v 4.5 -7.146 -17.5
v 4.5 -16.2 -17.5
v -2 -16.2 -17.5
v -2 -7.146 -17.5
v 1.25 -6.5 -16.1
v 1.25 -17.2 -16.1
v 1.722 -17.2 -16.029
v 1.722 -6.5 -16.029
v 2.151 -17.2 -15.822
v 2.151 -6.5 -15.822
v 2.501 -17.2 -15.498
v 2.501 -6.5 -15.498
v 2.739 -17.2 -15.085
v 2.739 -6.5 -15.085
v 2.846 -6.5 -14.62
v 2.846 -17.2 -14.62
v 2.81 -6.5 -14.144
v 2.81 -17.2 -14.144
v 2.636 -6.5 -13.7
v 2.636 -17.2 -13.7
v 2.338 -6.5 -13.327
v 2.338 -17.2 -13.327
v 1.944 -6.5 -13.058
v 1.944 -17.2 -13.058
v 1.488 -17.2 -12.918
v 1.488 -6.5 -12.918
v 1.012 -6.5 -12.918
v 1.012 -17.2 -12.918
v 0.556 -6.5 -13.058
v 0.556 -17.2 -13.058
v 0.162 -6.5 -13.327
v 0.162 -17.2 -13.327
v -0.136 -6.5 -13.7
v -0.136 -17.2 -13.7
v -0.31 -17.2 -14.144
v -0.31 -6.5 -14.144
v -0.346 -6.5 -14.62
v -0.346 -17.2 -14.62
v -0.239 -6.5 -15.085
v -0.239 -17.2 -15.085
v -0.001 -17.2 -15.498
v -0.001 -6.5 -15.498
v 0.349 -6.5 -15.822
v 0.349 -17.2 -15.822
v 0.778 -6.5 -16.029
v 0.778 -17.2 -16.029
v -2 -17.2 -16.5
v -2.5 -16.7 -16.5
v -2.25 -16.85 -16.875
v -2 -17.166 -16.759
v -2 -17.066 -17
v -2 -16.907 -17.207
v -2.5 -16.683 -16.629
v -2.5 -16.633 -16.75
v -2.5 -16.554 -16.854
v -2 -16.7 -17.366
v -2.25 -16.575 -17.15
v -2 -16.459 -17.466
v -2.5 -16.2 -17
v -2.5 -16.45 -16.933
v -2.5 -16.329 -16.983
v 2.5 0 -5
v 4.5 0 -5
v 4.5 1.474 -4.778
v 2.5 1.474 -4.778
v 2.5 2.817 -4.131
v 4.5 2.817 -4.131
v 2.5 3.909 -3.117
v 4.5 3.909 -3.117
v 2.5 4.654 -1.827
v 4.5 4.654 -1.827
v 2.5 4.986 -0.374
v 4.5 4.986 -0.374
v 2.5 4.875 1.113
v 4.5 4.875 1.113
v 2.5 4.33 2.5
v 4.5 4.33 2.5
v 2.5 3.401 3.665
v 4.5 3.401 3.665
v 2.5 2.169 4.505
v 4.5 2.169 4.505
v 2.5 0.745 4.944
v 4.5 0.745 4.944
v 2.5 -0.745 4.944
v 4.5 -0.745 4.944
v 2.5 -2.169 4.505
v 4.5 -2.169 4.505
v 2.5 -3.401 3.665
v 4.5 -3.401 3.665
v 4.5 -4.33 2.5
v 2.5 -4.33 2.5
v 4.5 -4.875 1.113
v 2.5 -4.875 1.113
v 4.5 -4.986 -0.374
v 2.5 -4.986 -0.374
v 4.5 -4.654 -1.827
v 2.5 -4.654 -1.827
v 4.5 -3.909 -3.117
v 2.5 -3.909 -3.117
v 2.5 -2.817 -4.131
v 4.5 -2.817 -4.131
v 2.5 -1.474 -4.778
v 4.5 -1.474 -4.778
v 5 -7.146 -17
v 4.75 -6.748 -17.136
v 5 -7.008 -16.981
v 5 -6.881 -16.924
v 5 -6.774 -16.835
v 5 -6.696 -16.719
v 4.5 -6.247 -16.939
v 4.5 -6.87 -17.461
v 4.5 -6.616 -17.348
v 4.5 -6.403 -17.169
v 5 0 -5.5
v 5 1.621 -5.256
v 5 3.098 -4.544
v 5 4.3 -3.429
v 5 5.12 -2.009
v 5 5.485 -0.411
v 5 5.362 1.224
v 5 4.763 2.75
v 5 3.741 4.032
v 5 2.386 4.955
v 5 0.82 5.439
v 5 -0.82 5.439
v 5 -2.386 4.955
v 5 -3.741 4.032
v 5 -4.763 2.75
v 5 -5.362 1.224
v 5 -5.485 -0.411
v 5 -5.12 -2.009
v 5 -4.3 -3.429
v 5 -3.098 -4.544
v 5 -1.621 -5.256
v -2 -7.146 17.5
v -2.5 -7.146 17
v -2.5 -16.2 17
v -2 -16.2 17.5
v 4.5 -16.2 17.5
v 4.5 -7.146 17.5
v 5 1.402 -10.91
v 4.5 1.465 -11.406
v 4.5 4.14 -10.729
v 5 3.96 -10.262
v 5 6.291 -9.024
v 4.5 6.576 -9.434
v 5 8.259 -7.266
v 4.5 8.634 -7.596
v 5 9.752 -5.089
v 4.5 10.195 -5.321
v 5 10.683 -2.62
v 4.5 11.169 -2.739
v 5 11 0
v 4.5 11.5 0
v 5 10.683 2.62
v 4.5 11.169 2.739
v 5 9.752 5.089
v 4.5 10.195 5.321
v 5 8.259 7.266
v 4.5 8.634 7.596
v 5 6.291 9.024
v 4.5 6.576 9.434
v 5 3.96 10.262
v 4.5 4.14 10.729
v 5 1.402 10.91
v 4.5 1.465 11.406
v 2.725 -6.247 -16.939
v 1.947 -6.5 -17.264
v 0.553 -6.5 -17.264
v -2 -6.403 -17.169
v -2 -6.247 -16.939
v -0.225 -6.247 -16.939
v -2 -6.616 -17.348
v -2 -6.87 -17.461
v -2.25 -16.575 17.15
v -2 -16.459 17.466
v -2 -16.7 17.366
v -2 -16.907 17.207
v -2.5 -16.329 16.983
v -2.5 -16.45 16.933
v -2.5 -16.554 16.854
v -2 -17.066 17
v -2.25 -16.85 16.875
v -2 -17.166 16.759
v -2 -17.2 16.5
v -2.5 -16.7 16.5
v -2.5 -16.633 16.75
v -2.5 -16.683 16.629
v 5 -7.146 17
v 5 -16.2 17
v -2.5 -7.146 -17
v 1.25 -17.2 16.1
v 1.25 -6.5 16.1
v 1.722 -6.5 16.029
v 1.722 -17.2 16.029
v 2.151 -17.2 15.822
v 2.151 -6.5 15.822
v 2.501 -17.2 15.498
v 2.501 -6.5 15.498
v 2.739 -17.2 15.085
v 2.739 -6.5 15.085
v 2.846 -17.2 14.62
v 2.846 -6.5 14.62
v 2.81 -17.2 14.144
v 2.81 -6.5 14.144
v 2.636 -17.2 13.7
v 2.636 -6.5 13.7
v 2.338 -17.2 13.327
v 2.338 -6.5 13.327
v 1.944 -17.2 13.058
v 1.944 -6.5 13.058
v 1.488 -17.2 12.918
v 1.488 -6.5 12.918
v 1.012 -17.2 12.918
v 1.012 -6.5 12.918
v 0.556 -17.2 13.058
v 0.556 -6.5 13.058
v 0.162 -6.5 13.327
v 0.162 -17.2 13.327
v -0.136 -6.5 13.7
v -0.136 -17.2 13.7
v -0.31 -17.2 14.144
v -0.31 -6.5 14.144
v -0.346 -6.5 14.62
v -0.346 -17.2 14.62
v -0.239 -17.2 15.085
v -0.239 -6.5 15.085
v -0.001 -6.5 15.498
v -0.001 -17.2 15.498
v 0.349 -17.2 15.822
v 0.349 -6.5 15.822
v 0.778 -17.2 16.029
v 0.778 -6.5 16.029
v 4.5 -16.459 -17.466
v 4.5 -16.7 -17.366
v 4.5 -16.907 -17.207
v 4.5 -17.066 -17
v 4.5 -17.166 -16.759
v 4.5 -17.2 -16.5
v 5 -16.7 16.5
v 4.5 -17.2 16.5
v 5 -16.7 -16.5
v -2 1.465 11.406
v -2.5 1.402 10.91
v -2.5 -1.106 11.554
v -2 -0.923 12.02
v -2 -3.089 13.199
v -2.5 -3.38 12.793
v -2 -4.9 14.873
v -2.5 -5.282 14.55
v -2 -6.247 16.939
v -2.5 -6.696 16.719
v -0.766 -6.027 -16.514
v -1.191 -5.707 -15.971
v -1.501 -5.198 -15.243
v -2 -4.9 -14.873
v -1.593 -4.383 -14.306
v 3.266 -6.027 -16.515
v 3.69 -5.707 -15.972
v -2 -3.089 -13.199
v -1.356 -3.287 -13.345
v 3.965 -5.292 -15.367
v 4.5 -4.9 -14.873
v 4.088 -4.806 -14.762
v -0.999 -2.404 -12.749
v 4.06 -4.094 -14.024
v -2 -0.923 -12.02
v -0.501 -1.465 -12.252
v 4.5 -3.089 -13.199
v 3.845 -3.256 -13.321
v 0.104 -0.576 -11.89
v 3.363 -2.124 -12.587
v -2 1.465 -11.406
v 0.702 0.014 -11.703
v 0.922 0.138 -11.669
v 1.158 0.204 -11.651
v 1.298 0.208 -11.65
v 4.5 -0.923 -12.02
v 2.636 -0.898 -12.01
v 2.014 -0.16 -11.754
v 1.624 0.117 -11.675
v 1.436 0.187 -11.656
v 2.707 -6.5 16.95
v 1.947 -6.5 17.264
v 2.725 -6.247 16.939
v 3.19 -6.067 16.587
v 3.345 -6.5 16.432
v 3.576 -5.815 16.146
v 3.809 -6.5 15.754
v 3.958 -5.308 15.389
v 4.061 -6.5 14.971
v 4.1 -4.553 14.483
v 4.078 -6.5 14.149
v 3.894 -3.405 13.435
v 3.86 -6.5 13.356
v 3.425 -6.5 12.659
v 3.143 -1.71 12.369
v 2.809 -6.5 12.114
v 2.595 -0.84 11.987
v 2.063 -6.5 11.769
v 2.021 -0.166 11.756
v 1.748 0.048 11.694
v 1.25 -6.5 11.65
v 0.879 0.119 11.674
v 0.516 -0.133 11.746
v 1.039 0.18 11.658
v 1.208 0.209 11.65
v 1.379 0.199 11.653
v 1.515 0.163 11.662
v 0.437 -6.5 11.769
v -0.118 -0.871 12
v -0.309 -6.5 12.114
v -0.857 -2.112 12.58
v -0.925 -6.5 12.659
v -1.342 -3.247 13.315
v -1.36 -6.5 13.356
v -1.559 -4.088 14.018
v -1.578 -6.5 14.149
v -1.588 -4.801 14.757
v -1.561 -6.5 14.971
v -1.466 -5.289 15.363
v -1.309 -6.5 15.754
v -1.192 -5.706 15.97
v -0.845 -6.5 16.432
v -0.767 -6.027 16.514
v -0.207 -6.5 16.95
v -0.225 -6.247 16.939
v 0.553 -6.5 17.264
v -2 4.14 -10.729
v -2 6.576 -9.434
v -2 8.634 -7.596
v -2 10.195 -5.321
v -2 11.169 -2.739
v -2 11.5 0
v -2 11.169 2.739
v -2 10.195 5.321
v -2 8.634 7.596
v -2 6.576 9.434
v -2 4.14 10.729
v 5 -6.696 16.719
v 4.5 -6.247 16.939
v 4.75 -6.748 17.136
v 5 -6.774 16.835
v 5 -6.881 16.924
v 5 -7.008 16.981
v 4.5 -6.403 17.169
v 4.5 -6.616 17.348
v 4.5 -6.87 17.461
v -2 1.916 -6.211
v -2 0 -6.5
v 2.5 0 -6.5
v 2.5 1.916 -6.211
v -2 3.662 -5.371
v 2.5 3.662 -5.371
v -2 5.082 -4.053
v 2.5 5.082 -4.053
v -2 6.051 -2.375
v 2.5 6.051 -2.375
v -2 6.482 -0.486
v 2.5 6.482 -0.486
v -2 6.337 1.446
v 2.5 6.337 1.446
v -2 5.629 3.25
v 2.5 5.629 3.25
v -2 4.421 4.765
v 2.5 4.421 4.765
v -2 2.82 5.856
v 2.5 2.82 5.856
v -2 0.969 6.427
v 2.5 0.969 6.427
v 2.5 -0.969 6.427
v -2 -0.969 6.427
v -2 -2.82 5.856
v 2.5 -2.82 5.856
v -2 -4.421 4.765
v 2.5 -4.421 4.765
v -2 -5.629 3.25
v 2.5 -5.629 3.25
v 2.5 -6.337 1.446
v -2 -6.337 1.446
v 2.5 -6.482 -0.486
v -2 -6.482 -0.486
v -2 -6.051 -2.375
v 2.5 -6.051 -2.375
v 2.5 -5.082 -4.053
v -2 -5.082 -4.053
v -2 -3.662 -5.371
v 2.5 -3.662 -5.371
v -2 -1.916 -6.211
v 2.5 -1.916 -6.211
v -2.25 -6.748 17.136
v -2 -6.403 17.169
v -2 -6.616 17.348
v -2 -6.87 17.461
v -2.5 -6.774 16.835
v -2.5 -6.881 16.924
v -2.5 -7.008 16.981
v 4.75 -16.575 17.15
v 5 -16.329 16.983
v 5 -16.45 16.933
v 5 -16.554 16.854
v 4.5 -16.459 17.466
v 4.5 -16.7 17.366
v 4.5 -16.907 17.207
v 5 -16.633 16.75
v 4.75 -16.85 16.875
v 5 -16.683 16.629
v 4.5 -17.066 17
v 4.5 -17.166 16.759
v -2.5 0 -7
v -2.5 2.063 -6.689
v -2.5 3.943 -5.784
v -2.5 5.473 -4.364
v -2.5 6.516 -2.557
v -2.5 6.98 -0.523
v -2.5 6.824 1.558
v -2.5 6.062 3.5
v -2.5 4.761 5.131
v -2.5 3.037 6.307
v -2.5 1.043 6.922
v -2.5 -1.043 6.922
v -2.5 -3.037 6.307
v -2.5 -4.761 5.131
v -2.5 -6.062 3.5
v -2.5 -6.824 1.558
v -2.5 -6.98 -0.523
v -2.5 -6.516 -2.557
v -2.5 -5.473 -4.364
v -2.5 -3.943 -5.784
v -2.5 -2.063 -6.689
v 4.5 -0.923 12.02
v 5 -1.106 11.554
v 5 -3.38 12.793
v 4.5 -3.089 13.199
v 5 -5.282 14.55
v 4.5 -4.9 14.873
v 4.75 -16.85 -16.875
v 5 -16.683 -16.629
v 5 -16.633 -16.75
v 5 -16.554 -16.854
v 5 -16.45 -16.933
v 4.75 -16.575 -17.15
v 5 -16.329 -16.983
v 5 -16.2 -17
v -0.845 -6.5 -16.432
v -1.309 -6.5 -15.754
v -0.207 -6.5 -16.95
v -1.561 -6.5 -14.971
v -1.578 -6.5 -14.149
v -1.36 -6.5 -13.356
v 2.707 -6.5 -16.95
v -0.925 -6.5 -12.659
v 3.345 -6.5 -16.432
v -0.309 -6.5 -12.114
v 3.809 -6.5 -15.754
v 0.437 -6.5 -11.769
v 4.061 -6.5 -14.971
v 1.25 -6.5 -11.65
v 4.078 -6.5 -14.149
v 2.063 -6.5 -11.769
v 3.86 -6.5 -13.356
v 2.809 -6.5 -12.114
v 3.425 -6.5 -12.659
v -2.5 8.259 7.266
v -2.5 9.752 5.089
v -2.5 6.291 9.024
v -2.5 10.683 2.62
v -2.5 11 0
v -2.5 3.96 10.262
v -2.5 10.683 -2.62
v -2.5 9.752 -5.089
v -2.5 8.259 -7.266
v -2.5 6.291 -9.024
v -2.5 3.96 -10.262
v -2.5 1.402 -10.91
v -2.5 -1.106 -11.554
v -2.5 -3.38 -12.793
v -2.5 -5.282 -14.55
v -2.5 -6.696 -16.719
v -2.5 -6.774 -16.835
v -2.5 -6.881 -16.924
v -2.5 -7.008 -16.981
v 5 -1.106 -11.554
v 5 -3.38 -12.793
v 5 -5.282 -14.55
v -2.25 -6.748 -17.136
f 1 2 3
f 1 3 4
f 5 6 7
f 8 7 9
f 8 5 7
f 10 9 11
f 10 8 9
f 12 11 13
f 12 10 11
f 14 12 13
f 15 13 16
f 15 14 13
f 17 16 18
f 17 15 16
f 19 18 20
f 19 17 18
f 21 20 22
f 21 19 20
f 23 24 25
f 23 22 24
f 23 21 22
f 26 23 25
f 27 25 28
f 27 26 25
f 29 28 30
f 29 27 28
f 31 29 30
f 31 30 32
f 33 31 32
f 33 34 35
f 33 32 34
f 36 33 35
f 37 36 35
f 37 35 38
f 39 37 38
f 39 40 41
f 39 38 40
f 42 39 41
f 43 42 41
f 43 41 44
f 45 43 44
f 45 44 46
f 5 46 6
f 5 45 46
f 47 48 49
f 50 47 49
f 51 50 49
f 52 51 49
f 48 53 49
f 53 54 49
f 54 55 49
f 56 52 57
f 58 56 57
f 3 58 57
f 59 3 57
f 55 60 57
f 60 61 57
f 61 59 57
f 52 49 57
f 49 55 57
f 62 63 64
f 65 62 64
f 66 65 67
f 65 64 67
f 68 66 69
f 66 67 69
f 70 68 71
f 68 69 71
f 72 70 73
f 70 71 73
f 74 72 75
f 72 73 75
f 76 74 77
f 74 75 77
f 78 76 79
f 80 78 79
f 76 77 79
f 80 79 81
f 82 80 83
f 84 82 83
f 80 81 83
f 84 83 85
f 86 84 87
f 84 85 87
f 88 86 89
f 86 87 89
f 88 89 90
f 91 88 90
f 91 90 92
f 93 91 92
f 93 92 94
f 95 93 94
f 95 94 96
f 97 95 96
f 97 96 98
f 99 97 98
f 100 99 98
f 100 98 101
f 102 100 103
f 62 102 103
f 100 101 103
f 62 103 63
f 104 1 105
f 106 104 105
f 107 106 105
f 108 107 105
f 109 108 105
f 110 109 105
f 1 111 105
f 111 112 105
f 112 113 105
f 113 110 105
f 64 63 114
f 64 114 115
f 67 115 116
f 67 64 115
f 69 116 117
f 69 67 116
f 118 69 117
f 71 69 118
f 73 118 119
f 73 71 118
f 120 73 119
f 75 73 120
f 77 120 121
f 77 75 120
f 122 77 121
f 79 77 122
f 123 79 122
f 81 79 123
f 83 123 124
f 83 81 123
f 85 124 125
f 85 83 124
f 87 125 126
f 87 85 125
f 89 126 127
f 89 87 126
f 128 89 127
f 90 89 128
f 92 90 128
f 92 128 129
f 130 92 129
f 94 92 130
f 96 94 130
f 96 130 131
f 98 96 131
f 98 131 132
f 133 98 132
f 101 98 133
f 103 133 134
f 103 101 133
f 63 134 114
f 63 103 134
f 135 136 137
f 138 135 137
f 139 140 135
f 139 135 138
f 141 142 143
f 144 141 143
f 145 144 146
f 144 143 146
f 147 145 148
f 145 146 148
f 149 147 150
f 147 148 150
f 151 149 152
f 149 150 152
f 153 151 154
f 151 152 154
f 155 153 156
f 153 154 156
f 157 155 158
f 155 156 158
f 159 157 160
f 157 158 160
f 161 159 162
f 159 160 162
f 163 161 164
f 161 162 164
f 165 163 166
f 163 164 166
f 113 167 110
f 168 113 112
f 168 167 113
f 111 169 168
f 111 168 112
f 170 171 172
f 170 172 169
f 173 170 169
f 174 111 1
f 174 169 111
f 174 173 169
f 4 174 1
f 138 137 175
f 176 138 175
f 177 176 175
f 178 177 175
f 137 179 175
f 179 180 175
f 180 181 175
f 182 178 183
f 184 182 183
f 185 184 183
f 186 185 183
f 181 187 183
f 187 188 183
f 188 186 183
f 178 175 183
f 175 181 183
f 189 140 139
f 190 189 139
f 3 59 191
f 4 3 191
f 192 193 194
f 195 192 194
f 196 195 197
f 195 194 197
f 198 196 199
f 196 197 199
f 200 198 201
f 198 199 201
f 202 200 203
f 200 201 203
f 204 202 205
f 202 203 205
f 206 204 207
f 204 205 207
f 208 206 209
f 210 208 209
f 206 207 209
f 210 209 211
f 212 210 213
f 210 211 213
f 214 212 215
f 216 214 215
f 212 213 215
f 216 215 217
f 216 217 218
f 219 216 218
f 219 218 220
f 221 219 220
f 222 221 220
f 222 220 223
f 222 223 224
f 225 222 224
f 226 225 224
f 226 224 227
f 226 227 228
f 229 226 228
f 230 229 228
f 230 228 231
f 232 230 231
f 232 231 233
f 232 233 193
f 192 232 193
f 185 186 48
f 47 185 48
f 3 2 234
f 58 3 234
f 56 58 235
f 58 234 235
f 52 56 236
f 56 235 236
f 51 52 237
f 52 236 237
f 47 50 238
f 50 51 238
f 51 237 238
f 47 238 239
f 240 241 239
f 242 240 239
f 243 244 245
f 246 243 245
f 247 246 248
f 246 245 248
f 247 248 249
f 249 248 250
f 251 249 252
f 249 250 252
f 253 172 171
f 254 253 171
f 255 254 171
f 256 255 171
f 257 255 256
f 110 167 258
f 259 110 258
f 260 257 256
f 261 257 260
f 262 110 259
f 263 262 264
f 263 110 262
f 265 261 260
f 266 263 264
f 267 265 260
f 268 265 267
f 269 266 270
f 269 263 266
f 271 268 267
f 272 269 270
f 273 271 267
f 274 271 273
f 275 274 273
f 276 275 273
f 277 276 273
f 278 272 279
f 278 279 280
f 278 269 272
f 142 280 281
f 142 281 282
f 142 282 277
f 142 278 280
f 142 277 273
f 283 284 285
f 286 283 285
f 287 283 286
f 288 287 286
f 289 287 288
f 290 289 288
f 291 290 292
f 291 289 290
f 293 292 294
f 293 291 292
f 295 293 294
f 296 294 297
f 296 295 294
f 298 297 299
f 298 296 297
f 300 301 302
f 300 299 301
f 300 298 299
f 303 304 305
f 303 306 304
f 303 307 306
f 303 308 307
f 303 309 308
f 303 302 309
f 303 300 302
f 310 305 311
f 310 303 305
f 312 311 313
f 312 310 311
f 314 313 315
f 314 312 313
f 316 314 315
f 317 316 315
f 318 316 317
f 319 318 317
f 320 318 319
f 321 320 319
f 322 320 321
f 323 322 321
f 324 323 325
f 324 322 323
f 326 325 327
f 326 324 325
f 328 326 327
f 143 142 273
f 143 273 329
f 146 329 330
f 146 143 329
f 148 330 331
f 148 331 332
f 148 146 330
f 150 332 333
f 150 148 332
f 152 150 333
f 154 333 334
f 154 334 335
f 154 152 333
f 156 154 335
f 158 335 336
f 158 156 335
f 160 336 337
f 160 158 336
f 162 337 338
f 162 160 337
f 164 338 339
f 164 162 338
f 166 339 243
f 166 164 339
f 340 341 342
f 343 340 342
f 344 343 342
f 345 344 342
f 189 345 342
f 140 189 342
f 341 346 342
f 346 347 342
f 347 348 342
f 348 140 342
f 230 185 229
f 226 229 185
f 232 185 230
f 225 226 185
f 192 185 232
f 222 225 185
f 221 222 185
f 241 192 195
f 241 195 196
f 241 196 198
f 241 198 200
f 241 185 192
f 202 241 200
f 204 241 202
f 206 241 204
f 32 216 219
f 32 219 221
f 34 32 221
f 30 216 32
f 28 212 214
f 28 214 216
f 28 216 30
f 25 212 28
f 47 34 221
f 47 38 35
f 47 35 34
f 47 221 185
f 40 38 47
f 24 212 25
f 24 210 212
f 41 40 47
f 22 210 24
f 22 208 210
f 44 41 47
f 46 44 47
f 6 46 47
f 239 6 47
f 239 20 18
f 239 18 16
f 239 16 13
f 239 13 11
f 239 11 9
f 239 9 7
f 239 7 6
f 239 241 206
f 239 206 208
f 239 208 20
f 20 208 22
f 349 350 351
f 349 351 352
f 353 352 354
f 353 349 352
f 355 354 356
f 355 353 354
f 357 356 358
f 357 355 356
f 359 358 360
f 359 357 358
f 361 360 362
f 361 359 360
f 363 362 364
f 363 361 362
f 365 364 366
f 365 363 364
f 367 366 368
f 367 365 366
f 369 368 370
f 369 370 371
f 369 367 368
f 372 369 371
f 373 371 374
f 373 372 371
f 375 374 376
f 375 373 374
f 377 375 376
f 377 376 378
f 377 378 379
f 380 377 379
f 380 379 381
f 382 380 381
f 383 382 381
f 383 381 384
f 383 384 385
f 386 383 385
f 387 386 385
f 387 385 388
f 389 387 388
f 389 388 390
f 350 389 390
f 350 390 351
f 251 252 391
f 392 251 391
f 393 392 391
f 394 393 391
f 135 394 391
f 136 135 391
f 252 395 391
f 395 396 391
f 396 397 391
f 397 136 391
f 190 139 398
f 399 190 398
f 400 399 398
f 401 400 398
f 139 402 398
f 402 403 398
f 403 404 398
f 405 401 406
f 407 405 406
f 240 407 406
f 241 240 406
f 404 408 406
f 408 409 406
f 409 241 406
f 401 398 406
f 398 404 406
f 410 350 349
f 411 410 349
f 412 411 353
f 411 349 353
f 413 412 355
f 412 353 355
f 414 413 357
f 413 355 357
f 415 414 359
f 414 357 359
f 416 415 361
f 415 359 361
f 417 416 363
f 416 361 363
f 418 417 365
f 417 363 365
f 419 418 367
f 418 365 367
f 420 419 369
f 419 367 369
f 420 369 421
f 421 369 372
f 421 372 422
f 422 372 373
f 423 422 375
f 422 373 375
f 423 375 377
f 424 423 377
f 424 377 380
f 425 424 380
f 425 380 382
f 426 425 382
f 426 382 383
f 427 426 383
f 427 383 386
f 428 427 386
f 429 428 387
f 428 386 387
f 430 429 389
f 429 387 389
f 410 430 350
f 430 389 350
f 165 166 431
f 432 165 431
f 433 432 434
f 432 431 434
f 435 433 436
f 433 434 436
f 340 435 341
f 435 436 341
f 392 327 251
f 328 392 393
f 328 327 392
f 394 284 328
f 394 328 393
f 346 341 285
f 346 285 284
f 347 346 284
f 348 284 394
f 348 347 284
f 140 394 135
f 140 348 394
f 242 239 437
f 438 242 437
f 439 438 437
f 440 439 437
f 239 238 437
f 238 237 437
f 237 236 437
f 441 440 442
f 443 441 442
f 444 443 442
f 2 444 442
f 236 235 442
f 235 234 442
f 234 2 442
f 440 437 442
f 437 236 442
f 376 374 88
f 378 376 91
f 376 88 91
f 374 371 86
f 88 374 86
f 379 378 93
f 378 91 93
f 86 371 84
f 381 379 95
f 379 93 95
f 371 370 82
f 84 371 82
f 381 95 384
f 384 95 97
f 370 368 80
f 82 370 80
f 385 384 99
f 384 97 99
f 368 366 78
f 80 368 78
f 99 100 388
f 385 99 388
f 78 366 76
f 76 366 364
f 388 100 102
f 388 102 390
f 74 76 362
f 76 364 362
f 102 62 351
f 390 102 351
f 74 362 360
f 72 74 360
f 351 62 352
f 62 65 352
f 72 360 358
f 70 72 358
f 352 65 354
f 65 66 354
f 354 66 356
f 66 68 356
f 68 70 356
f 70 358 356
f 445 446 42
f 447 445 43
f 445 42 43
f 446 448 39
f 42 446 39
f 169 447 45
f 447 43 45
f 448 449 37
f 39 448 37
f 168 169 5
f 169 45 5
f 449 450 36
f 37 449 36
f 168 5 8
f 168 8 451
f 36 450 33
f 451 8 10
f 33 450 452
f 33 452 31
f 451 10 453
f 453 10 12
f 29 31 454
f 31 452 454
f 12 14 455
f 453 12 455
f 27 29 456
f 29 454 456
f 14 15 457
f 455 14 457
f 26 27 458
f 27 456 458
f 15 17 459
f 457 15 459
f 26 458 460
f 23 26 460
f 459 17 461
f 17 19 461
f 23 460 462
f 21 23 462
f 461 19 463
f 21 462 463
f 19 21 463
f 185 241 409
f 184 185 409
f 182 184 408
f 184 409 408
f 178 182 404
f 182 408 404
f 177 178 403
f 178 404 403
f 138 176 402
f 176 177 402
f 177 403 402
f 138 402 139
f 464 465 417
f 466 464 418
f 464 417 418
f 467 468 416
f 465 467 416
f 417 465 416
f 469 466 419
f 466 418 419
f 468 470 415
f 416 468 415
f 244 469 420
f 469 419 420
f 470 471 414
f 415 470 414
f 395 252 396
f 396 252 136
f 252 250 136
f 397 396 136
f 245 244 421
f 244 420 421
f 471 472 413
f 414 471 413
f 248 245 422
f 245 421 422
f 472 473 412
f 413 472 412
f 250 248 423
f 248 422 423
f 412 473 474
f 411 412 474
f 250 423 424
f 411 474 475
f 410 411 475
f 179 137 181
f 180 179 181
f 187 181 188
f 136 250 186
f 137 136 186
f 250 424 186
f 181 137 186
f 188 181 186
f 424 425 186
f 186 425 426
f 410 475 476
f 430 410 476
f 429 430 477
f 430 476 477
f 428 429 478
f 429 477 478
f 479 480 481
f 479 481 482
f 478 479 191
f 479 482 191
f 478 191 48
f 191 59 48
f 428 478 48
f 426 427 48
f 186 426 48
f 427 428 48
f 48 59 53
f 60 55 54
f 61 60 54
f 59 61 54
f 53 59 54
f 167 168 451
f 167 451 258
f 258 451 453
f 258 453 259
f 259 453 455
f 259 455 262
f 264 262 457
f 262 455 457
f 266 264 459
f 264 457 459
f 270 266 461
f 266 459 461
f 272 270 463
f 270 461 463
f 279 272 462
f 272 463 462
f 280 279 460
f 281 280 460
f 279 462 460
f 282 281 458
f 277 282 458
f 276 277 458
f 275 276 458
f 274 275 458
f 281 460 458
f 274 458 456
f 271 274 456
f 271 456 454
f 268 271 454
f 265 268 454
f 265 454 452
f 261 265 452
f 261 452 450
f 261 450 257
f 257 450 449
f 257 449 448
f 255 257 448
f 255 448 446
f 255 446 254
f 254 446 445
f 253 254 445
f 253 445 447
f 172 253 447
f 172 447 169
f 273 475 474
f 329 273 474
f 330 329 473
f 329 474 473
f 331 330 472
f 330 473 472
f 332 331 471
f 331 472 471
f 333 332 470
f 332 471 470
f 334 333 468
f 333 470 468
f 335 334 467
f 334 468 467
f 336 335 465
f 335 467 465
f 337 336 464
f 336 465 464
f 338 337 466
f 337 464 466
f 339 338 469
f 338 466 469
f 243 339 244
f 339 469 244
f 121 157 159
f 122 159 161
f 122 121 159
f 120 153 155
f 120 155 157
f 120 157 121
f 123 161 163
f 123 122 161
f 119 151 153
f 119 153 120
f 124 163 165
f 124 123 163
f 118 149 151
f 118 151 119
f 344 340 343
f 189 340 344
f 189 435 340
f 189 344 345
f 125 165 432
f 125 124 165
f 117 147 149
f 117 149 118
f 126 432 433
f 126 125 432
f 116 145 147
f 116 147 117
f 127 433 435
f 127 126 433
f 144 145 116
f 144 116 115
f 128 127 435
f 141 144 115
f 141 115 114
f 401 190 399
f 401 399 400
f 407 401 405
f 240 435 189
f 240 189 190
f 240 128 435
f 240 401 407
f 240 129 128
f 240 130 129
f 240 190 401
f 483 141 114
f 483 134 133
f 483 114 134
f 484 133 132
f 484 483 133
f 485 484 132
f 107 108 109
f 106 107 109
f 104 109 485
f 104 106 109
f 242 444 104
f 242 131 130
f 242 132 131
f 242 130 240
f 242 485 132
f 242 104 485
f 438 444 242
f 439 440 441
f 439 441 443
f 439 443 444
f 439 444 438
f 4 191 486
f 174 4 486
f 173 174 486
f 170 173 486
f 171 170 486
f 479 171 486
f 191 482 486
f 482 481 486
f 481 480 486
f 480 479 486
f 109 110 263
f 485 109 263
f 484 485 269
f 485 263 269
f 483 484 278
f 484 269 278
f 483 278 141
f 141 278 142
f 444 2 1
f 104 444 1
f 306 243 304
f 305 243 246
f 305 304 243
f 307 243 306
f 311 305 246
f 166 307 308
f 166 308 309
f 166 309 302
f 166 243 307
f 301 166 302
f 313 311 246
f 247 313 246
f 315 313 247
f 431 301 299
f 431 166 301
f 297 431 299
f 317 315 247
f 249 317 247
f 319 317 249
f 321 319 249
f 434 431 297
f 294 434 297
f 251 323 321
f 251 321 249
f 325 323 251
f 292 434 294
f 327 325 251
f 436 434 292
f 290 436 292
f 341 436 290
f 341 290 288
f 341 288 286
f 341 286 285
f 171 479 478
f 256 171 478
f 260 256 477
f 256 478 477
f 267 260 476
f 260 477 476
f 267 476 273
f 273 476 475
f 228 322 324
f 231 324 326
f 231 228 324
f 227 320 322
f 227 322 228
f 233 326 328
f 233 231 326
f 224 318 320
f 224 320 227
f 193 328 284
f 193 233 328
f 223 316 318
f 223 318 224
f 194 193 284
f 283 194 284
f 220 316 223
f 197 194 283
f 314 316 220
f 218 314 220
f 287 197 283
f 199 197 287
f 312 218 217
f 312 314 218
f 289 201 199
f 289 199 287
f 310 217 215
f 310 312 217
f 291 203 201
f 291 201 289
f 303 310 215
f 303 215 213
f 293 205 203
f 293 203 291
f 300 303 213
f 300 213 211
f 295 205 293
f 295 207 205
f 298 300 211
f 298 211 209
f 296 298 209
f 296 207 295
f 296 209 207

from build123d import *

# Parameters (mm, degrees)
SKETCH1_R           = 6.5
BOSS_EXTRUDE1_DEPTH = 2.5
BOSS_EXTRUDE2_START = 2.5
SKETCH2_R           = 5
BOSS_EXTRUDE2_DEPTH = 2.5
FILLET1_R           = 10
FILLET2_R           = 1
CHAMFER1_SIZE       = 0.5
SKETCH3_R           = 2.85
CUT_EXTRUDE1_DEPTH  = 26.597851472
SKETCH4_R           = 1.6
CUT_EXTRUDE2_DEPTH  = 26.597851541


with BuildPart() as part:
    # Sketch1 → Boss-Extrude1 (new, symmetric)
    with BuildSketch(Plane(origin=(0, 0, 0), x_dir=(0, 0, -1), z_dir=(1, 0, 0))):
        with BuildLine():
            Line((-9.486832981, -6.5), (-17.5, -6.5))
            Line((-17.5, -6.5), (-17.5, -17.2))
            Line((-17.5, -17.2), (17.5, -17.2))
            Line((17.5, -17.2), (17.5, -6.5))
            Line((17.5, -6.5), (9.486832981, -6.5))
            ThreePointArc((9.486832981, -6.5), (0, 11.5), (-9.486832981, -6.5))
        make_face()
        Circle(SKETCH1_R, mode=Mode.SUBTRACT)
    extrude(amount=BOSS_EXTRUDE1_DEPTH, both=True)

    # Sketch2 → Boss-Extrude2 (add)
    with BuildSketch(Plane(origin=(2.5, 0, 0), x_dir=(0, 0, -1), z_dir=(1, 0, 0)).offset(BOSS_EXTRUDE2_START)):
        with BuildLine():
            Line((-9.486832981, -6.5), (-17.5, -6.5))
            Line((-17.5, -6.5), (-17.5, -17.2))
            Line((-17.5, -17.2), (17.5, -17.2))
            Line((17.5, -17.2), (17.5, -6.5))
            Line((17.5, -6.5), (9.486832981, -6.5))
            ThreePointArc((9.486832981, -6.5), (0, 11.5), (-9.486832981, -6.5))
        make_face()
        Circle(SKETCH2_R, mode=Mode.SUBTRACT)
    extrude(amount=-BOSS_EXTRUDE2_DEPTH)

    # Fillet1
    # the kernel refuses this fillet: 10 mm, written as the material it adds along each edge
    with BuildSketch(Plane(origin=(5, -6.5, 9.486832981), x_dir=(0, 0, 1), z_dir=(-1, 0, 0))) as fillet1_piece_1:
        with BuildLine():
            CenterArc((11.837899914, 9.239665486), FILLET1_R, 187.320893322, 60.192138393)
            Line((1.919419498, 7.965402469), (1.72104989, 7.939917209))
            ThreePointArc((1.72104989, 7.939917209), (1.498721871, 3.852815723), (-0.1649884, 0.113043478))
            Line((-0.1649884, 0.113043478), (0, -0.2))
            ThreePointArc((0, -0.2), (4.00658351, -0.2), (7.936672362, -0.18479331))
            Line((7.936672362, -0.18479331), (8.013167019, 0))
        make_face()
    extrude(amount=7.5)
    with BuildSketch(Plane(origin=(5, -6.5, -9.486832981), x_dir=(0, 0.9721729957330114, -0.23426409534434056), z_dir=(-1, 0, 0))) as fillet1_piece_2:
        with BuildLine():
            CenterArc((11.755748189, 9.343964746), FILLET1_R, 188.938720591, 60.192138393)
            Line((1.877197323, 7.790184587), (1.679626305, 7.759108983))
            ThreePointArc((1.679626305, 7.759108983), (0.744164062, 3.941945112), (-0.194434599, 0.046852819))
            Line((-0.194434599, 0.046852819), (0.071246959, -0.186879295))
            ThreePointArc((0.071246959, -0.186879295), (4.096700126, 0.554440542), (8.122153294, -0.186879295))
            Line((8.122153294, -0.186879295), (8.193400253, 0))
        make_face()
    extrude(amount=7.5)

    # Fillet2
    fillet2_edges = [part.edges().sort_by_distance(p)[0] for p in [
        (1.25, -6.5, -17.5),
        (1.25, -17.2, -17.5),
        (1.25, -17.2, 17.5),
        (1.25, -6.5, 17.5),
    ]]
    fillet(fillet2_edges, radius=FILLET2_R)

    # Chamfer1
    chamfer1_edges = [part.edges().sort_by_distance(p)[0] for p in [
        (-2.5, 0, 6.5),
        (5, 0, 5),
        (-2.5, 11.5, 0),
        (5, 11.5, 0),
        (-2.5, -3.089050017, -13.199089807),
        (5, -3.089050017, 13.199089807),
        (-2.5, -11.672887978, -17.5),
        (5, -11.672887978, -17.5),
        (-2.5, -17.2, 0),
        (-2.5, -11.672887978, 17.5),
        (-2.5, -3.089050017, 13.199089807),
        (-2.5, -6.61597037, 17.348119119),
        (-2.5, -16.907106781, 17.207106781),
        (-2.5, -6.61597037, -17.348119119),
        (-2.5, -16.907106781, -17.207106781),
        (5, -17.2, 0),
        (5, -3.089050017, -13.199089807),
        (5, -11.672887978, 17.5),
        (5, -6.61597037, 17.348119119),
        (5, -16.907106781, 17.207106781),
        (5, -6.61597037, -17.348119119),
        (5, -16.907106781, -17.207106781),
    ]]
    chamfer(chamfer1_edges, length=CHAMFER1_SIZE)

    # Sketch3 → Cut-Extrude1 (cut, through all)
    with BuildSketch(Plane(origin=(0, -6.5, 0), x_dir=(1, 0, 0), z_dir=(0, 1, 0))):
        with Locations((1.25, -14.5)):
            Circle(SKETCH3_R)
    cut_extrude1 = extrude(amount=CUT_EXTRUDE1_DEPTH, mode=Mode.SUBTRACT)

    # Sketch4 → Cut-Extrude2 (cut, through all)
    with BuildSketch(Plane(origin=(0, -6.5, 0), x_dir=(1, 0, 0), z_dir=(0, 1, 0))):
        with Locations(Location((1.25, -14.5, 0), (0, 0, 270))):
            Circle(SKETCH4_R)
    cut_extrude2 = extrude(amount=-CUT_EXTRUDE2_DEPTH, mode=Mode.SUBTRACT)

    # Mirror1: Cut-Extrude1, Cut-Extrude2 across plane
    add(cut_extrude1.mirror(Plane.XY), mode=Mode.SUBTRACT)
    add(cut_extrude2.mirror(Plane.XY), mode=Mode.SUBTRACT)


solid = part.part
